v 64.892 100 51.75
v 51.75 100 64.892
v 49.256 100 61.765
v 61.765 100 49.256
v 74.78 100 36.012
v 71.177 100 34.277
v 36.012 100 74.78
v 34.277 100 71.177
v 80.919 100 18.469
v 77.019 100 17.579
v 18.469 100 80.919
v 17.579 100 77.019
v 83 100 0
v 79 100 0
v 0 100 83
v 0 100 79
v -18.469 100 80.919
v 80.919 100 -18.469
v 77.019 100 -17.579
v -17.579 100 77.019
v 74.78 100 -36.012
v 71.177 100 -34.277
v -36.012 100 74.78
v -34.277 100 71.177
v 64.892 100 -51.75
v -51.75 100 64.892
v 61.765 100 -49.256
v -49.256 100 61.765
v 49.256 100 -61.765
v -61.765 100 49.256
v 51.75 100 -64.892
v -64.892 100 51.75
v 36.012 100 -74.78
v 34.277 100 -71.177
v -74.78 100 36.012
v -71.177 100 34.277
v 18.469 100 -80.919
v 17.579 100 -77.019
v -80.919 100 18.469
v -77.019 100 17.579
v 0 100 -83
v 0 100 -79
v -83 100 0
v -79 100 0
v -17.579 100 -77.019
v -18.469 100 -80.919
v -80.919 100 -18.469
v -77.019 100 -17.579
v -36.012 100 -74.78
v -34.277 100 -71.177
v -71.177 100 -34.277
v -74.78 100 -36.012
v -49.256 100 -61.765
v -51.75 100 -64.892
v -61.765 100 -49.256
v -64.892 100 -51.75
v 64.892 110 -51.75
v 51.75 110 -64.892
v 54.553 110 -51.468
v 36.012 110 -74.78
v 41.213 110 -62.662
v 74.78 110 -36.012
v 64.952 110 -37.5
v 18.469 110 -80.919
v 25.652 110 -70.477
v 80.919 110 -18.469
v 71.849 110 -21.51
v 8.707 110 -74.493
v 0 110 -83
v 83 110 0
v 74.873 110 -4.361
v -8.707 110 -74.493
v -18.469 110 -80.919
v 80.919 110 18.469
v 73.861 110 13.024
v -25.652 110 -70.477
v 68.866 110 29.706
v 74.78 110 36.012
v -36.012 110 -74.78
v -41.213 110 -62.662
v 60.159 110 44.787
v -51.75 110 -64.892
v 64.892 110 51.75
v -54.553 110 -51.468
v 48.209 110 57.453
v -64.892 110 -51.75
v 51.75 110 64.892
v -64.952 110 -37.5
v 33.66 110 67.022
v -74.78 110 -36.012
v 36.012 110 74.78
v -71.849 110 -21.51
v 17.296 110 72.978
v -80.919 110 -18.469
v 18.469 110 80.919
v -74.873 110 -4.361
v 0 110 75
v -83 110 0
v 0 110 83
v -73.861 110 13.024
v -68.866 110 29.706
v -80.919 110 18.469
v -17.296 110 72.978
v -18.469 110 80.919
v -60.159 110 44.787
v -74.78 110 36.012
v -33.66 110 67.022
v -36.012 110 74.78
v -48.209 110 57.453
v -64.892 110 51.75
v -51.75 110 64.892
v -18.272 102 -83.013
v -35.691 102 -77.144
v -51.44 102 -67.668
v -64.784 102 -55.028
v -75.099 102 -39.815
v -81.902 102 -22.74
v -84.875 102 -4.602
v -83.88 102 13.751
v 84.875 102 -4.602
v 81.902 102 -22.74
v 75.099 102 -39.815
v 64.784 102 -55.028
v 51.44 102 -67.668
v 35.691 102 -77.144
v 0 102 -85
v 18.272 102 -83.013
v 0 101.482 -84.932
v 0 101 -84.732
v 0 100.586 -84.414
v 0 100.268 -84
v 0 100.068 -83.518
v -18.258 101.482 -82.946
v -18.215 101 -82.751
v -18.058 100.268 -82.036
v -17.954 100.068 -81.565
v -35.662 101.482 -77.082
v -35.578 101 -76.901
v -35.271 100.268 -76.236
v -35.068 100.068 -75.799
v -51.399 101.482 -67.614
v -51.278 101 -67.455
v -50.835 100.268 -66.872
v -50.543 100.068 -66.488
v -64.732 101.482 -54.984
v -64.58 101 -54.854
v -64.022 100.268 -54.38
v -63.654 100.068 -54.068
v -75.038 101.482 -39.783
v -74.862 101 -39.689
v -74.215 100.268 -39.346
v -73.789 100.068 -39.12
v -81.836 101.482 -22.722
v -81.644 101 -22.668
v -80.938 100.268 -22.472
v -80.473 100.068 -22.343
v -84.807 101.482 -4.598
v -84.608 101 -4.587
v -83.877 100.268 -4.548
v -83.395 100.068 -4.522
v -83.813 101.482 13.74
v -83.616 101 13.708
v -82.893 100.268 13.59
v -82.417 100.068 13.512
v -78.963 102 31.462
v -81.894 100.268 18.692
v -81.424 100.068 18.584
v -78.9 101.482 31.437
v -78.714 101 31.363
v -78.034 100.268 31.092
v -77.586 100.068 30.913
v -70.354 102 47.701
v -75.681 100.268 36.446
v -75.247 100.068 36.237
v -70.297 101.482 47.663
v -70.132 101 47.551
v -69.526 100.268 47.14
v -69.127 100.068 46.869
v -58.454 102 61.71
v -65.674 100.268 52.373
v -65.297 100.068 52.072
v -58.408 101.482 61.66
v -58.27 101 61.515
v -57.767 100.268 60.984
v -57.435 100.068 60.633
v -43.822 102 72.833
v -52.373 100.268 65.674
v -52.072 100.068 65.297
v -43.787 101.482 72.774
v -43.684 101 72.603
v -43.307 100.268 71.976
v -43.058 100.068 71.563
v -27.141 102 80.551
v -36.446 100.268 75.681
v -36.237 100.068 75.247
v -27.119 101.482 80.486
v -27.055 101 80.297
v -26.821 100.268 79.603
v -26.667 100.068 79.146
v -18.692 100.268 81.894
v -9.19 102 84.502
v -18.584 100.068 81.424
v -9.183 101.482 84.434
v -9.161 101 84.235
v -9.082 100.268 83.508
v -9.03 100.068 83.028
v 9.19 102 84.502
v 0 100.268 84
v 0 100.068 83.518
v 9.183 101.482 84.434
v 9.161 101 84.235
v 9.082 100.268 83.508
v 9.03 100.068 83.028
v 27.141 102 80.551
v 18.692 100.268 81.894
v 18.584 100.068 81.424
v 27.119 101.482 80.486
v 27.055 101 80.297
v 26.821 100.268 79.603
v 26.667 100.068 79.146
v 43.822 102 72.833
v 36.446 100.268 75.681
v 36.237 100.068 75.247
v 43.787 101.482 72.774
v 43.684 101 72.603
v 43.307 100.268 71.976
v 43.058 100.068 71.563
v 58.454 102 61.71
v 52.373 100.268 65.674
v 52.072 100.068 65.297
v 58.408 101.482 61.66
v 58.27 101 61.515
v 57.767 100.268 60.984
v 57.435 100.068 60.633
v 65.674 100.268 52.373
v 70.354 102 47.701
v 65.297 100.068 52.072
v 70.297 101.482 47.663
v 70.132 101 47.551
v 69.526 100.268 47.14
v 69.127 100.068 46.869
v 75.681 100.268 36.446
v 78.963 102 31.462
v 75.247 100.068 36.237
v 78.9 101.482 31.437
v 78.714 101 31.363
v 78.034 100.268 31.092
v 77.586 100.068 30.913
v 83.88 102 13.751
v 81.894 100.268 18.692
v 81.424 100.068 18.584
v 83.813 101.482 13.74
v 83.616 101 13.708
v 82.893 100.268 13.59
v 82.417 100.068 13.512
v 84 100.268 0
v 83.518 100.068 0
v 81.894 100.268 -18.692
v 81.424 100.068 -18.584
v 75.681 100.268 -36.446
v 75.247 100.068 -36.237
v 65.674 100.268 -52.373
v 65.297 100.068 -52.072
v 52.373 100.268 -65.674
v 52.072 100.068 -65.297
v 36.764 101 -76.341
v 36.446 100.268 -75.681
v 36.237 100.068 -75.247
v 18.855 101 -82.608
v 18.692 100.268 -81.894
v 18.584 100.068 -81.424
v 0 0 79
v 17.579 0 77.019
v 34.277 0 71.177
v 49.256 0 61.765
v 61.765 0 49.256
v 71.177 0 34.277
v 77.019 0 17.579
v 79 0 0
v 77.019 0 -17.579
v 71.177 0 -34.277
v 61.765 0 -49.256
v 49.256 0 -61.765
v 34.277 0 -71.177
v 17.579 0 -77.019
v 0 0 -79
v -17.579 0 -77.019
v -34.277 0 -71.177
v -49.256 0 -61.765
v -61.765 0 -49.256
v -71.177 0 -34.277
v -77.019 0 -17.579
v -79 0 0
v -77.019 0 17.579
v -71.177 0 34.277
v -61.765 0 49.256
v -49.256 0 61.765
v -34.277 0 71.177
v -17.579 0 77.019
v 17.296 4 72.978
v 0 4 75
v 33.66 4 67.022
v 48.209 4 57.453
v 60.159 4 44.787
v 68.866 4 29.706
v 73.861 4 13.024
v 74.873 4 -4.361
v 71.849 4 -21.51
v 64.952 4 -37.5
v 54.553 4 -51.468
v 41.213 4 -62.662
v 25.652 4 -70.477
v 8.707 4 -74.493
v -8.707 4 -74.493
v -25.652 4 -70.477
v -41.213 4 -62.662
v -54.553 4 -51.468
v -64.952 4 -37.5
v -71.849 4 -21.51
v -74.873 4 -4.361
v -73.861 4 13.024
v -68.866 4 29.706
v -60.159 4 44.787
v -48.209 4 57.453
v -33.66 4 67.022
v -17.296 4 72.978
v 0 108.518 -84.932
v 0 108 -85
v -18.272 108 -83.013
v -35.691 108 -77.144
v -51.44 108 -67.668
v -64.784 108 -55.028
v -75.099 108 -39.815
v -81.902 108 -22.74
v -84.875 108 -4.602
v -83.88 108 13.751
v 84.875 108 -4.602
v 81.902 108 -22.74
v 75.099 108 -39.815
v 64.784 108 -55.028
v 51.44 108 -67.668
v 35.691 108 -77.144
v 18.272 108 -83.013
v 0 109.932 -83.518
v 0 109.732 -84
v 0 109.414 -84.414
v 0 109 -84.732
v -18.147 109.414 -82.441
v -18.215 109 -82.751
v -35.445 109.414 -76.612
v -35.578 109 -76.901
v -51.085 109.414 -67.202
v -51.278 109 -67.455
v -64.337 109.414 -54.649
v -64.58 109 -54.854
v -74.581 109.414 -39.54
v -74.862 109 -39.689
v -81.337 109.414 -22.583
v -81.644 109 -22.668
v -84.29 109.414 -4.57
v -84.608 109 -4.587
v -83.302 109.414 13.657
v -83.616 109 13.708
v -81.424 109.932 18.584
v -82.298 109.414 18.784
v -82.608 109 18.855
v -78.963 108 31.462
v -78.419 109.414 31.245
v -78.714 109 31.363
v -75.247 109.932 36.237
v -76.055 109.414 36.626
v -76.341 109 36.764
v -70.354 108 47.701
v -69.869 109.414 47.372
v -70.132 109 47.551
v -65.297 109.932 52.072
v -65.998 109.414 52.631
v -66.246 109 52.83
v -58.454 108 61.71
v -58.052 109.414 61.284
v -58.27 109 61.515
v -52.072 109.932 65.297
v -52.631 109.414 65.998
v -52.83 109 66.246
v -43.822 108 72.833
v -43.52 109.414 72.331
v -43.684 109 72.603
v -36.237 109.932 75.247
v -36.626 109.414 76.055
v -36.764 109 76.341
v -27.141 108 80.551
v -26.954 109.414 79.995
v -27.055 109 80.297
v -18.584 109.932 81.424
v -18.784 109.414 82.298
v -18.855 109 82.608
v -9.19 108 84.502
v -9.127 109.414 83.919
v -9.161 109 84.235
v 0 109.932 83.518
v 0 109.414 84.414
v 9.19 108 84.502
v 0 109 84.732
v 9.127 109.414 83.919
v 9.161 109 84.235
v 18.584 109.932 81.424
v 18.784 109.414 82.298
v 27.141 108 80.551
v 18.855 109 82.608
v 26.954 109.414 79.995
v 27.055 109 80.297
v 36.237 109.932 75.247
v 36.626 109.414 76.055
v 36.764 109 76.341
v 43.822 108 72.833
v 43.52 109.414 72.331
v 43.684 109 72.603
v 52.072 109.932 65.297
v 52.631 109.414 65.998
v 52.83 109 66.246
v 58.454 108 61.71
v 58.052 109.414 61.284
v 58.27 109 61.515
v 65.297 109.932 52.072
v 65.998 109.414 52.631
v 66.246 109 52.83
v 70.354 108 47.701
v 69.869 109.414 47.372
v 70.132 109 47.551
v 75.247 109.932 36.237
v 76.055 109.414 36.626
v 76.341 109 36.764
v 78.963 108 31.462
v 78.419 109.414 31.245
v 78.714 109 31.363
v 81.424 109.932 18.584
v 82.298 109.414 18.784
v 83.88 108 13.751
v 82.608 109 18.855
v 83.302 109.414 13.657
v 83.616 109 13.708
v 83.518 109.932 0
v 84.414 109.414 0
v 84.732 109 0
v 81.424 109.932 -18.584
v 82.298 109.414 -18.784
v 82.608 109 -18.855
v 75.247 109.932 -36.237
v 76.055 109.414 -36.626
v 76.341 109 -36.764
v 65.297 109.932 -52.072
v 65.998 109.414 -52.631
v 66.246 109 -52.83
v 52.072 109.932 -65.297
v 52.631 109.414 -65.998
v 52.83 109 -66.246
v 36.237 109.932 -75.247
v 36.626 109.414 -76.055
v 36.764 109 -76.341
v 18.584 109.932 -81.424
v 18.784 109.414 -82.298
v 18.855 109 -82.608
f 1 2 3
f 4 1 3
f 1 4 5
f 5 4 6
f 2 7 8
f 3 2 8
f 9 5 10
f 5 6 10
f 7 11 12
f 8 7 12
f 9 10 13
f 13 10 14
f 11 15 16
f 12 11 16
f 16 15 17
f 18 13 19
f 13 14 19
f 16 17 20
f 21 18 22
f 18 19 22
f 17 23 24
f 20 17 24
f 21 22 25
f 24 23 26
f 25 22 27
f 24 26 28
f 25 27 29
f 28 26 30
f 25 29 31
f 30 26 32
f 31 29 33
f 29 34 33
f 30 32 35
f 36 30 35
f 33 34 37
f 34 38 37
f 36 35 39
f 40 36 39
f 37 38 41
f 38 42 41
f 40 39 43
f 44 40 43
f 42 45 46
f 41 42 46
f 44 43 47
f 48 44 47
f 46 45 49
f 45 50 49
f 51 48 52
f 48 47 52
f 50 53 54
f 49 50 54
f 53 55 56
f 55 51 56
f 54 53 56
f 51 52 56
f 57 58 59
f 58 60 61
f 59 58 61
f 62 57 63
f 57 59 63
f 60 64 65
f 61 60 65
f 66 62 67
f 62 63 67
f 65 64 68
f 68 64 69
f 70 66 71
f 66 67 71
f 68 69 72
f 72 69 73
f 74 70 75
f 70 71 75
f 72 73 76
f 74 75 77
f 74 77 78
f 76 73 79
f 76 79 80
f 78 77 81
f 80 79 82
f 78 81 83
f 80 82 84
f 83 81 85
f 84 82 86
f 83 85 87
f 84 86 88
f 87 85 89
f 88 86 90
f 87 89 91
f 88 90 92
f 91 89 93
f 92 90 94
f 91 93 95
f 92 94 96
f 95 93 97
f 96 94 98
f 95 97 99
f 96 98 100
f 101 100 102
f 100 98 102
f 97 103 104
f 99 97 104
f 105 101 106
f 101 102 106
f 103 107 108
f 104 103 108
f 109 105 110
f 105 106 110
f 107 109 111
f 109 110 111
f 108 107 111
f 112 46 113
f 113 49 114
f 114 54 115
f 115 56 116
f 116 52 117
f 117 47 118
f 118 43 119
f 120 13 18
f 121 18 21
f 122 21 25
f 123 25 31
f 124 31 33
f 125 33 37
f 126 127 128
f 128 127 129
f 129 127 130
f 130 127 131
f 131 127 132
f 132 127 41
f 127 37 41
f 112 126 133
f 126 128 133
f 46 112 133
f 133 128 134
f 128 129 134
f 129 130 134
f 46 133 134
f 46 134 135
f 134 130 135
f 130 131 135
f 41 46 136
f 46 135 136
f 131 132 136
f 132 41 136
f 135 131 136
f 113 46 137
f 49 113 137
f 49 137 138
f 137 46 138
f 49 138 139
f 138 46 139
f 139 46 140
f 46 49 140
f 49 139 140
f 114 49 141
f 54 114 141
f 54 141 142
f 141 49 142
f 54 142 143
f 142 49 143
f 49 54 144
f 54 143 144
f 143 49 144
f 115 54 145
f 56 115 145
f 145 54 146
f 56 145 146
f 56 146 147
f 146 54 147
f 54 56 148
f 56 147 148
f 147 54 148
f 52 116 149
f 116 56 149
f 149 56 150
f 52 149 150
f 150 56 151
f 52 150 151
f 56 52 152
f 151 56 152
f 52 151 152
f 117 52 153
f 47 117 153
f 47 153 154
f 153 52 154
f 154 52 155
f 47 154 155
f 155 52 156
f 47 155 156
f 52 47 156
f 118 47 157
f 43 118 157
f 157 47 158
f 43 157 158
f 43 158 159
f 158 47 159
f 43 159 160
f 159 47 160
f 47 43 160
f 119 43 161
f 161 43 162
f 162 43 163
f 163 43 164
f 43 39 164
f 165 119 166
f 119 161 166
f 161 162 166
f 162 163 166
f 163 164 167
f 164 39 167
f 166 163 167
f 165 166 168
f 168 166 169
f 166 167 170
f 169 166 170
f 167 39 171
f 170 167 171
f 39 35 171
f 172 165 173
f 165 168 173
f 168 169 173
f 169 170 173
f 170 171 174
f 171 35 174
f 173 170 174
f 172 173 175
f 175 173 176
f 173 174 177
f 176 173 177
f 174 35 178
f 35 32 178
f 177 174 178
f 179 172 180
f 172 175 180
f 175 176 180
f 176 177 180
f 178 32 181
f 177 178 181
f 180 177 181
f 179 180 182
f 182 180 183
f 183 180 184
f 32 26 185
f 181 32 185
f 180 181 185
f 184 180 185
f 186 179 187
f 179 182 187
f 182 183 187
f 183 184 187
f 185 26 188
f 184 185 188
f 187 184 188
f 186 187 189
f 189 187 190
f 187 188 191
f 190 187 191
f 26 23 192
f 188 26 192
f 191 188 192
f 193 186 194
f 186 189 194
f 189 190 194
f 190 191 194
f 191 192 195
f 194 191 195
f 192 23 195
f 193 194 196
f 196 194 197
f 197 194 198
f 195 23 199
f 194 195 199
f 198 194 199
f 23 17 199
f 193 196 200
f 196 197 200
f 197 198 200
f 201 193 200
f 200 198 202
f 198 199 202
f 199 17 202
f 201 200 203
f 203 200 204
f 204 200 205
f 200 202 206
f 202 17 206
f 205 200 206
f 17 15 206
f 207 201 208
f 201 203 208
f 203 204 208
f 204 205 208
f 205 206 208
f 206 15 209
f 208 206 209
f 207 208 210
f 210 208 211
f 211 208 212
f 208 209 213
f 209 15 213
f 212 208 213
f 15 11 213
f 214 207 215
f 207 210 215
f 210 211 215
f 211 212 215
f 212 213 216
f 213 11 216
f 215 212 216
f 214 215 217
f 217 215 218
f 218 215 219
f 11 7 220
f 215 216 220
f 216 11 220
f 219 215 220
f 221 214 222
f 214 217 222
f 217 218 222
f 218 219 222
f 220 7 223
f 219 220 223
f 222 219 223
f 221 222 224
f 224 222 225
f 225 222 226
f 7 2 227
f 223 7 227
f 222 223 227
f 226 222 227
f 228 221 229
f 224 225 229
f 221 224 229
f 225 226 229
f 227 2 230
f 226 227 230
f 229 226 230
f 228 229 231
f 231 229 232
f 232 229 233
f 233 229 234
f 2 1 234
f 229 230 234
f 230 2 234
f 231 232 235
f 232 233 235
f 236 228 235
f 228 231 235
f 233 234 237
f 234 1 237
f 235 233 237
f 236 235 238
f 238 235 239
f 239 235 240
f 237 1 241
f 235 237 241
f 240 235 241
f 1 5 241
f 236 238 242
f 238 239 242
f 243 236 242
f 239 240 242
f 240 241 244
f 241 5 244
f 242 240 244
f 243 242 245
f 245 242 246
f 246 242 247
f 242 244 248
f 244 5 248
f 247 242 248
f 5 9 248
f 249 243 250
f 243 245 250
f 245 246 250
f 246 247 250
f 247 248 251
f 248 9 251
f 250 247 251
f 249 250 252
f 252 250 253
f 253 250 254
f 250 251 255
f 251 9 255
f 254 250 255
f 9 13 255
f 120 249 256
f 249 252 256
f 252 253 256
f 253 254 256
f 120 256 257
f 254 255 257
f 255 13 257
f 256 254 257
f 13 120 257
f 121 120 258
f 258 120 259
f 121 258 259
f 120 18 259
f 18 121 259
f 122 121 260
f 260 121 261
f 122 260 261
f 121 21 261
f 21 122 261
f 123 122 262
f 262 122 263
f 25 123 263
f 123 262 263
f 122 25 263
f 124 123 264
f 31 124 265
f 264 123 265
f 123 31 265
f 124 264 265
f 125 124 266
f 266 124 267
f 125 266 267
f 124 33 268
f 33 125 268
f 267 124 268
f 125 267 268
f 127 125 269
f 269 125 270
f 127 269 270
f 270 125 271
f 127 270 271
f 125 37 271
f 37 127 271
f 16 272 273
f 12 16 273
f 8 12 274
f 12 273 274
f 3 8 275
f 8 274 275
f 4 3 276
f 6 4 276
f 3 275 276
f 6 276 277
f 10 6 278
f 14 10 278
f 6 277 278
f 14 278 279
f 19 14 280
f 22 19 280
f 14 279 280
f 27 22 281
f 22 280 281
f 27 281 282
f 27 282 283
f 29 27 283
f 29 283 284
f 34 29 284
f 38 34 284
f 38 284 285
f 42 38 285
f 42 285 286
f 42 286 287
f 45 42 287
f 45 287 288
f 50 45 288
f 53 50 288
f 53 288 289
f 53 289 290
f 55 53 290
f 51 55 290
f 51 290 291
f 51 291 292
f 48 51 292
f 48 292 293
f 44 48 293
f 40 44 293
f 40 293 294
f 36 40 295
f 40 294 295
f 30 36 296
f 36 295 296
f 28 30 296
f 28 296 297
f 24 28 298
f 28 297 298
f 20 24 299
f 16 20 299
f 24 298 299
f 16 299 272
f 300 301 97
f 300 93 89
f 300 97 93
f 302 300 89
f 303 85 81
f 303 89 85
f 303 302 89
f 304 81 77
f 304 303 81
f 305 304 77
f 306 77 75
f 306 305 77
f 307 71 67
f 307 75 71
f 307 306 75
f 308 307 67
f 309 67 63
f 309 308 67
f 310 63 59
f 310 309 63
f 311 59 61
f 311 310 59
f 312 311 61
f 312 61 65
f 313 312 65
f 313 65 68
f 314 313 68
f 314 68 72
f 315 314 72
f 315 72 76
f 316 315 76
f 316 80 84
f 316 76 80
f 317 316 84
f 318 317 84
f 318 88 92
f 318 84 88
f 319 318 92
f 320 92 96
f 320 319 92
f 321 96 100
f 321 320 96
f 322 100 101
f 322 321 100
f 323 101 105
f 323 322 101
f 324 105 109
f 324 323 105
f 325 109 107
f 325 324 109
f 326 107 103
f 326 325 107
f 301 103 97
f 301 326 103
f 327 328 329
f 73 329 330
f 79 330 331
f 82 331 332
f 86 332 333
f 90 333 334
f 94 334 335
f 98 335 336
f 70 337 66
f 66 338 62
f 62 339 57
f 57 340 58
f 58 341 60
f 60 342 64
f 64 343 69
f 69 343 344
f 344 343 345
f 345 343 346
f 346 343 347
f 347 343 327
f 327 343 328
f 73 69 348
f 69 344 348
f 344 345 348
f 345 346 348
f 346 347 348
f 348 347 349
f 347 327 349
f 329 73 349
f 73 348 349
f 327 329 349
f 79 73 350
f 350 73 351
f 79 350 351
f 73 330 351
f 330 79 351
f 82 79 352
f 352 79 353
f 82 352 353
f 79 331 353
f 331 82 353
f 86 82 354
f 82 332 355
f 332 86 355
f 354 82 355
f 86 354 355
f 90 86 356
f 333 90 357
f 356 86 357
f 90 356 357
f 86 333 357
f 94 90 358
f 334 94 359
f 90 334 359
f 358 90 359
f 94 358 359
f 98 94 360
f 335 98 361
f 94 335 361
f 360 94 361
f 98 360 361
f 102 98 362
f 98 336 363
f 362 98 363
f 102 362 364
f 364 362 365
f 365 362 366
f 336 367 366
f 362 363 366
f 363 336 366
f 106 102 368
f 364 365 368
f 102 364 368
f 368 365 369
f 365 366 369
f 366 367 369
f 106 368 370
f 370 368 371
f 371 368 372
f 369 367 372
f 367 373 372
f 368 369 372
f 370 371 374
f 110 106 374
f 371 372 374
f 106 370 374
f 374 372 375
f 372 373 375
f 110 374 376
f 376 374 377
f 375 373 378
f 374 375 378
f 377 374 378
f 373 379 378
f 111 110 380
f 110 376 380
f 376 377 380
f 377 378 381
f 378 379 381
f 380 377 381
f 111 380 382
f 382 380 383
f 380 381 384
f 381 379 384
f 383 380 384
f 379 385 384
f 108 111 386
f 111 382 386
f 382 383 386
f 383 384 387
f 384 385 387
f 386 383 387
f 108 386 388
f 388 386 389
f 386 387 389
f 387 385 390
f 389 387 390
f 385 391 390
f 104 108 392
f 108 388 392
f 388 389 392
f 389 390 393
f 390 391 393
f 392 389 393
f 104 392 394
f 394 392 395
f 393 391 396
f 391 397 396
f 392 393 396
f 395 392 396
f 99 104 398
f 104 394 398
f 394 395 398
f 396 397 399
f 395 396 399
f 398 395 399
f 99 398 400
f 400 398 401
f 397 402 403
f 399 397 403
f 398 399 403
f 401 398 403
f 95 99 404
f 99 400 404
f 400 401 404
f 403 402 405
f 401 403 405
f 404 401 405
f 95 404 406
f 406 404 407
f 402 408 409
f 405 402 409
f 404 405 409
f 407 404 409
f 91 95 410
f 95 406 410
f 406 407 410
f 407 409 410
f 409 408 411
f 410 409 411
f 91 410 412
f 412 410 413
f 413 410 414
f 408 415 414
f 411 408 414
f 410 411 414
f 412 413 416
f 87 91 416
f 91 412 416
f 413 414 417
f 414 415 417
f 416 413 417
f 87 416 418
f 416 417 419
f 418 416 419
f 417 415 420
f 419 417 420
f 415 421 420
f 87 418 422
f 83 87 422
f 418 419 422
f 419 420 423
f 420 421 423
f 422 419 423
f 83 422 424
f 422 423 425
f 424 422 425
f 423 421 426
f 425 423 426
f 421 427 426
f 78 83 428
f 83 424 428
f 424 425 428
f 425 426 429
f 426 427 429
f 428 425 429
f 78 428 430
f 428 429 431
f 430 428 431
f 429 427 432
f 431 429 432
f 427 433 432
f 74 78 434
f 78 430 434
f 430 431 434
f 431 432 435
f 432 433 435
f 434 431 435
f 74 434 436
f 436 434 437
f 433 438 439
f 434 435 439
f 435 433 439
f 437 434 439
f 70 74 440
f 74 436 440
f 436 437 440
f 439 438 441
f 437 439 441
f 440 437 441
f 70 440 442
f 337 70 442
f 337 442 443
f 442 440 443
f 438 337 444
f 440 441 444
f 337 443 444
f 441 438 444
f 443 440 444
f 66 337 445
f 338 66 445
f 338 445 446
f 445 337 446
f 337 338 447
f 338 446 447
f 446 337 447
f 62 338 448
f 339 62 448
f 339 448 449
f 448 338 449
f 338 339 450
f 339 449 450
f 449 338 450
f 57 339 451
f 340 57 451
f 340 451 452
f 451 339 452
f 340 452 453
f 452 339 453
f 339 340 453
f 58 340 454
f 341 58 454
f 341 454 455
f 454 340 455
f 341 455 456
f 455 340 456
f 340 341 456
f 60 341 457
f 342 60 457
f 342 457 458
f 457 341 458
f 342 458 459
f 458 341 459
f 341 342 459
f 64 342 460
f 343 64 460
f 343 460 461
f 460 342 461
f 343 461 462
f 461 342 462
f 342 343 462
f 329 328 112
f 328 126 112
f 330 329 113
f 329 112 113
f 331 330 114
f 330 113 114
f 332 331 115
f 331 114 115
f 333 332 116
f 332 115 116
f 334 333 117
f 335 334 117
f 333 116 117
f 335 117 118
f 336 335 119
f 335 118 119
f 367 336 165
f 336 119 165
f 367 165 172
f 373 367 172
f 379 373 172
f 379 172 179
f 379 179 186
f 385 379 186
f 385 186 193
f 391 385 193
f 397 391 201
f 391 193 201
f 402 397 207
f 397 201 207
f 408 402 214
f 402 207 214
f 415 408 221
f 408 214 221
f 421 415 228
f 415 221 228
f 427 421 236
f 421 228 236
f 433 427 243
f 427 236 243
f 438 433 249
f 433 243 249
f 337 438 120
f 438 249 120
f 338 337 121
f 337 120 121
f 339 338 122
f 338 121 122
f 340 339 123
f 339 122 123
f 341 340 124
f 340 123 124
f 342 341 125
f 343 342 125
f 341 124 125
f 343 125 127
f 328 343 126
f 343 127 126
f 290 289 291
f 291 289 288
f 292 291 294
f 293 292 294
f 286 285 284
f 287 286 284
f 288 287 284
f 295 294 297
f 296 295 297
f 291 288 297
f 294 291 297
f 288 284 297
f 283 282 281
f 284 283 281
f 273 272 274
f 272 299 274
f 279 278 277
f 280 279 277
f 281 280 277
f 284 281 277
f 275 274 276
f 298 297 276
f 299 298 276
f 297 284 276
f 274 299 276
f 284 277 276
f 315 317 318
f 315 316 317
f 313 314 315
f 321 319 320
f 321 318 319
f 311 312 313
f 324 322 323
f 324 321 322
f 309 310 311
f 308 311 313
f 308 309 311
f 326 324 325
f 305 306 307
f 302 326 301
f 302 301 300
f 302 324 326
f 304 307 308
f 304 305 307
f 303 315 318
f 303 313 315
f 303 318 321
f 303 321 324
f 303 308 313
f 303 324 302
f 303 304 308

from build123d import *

# Parameters (mm, degrees)
SKETCH1_R           = 79
BOSS_EXTRUDE1_DEPTH = 110
SHELL1_T            = -4


with BuildPart() as part:
    # Sketch1 → Boss-Extrude1 (new body)
    with BuildSketch(Plane(origin=(0, 0, 0), x_dir=(1, 0, 0), z_dir=(0, 1, 0))):
        with Locations(Location((0, 0, 0), (0, 0, 270))):
            Circle(SKETCH1_R)
    extrude(amount=BOSS_EXTRUDE1_DEPTH)

    # Shell1
    shell1_openings = [part.faces().sort_by_distance(p)[0] for p in [
        (0, 110, 0),
    ]]
    offset(amount=SHELL1_T, openings=shell1_openings, kind=Kind.INTERSECTION)

    # Sketch2 → Revolve1 (revolve)
    with BuildSketch(Plane(origin=(0, 0, 0), x_dir=(0, 0, -1), z_dir=(1, 0, 0))):
        with BuildLine():
            Line((79, 110), (83, 110))
            ThreePointArc((83, 110), (84.414213562, 109.414213562), (85, 108))
            Line((85, 108), (85, 102))
            ThreePointArc((85, 102), (84.414213562, 100.585786438), (83, 100))
            Line((83, 100), (79, 100))
            Line((79, 100), (79, 110))
        make_face()
    revolve(axis=Axis((0, -5.5, 0), (0, 1, 0)))


solid = part.part
